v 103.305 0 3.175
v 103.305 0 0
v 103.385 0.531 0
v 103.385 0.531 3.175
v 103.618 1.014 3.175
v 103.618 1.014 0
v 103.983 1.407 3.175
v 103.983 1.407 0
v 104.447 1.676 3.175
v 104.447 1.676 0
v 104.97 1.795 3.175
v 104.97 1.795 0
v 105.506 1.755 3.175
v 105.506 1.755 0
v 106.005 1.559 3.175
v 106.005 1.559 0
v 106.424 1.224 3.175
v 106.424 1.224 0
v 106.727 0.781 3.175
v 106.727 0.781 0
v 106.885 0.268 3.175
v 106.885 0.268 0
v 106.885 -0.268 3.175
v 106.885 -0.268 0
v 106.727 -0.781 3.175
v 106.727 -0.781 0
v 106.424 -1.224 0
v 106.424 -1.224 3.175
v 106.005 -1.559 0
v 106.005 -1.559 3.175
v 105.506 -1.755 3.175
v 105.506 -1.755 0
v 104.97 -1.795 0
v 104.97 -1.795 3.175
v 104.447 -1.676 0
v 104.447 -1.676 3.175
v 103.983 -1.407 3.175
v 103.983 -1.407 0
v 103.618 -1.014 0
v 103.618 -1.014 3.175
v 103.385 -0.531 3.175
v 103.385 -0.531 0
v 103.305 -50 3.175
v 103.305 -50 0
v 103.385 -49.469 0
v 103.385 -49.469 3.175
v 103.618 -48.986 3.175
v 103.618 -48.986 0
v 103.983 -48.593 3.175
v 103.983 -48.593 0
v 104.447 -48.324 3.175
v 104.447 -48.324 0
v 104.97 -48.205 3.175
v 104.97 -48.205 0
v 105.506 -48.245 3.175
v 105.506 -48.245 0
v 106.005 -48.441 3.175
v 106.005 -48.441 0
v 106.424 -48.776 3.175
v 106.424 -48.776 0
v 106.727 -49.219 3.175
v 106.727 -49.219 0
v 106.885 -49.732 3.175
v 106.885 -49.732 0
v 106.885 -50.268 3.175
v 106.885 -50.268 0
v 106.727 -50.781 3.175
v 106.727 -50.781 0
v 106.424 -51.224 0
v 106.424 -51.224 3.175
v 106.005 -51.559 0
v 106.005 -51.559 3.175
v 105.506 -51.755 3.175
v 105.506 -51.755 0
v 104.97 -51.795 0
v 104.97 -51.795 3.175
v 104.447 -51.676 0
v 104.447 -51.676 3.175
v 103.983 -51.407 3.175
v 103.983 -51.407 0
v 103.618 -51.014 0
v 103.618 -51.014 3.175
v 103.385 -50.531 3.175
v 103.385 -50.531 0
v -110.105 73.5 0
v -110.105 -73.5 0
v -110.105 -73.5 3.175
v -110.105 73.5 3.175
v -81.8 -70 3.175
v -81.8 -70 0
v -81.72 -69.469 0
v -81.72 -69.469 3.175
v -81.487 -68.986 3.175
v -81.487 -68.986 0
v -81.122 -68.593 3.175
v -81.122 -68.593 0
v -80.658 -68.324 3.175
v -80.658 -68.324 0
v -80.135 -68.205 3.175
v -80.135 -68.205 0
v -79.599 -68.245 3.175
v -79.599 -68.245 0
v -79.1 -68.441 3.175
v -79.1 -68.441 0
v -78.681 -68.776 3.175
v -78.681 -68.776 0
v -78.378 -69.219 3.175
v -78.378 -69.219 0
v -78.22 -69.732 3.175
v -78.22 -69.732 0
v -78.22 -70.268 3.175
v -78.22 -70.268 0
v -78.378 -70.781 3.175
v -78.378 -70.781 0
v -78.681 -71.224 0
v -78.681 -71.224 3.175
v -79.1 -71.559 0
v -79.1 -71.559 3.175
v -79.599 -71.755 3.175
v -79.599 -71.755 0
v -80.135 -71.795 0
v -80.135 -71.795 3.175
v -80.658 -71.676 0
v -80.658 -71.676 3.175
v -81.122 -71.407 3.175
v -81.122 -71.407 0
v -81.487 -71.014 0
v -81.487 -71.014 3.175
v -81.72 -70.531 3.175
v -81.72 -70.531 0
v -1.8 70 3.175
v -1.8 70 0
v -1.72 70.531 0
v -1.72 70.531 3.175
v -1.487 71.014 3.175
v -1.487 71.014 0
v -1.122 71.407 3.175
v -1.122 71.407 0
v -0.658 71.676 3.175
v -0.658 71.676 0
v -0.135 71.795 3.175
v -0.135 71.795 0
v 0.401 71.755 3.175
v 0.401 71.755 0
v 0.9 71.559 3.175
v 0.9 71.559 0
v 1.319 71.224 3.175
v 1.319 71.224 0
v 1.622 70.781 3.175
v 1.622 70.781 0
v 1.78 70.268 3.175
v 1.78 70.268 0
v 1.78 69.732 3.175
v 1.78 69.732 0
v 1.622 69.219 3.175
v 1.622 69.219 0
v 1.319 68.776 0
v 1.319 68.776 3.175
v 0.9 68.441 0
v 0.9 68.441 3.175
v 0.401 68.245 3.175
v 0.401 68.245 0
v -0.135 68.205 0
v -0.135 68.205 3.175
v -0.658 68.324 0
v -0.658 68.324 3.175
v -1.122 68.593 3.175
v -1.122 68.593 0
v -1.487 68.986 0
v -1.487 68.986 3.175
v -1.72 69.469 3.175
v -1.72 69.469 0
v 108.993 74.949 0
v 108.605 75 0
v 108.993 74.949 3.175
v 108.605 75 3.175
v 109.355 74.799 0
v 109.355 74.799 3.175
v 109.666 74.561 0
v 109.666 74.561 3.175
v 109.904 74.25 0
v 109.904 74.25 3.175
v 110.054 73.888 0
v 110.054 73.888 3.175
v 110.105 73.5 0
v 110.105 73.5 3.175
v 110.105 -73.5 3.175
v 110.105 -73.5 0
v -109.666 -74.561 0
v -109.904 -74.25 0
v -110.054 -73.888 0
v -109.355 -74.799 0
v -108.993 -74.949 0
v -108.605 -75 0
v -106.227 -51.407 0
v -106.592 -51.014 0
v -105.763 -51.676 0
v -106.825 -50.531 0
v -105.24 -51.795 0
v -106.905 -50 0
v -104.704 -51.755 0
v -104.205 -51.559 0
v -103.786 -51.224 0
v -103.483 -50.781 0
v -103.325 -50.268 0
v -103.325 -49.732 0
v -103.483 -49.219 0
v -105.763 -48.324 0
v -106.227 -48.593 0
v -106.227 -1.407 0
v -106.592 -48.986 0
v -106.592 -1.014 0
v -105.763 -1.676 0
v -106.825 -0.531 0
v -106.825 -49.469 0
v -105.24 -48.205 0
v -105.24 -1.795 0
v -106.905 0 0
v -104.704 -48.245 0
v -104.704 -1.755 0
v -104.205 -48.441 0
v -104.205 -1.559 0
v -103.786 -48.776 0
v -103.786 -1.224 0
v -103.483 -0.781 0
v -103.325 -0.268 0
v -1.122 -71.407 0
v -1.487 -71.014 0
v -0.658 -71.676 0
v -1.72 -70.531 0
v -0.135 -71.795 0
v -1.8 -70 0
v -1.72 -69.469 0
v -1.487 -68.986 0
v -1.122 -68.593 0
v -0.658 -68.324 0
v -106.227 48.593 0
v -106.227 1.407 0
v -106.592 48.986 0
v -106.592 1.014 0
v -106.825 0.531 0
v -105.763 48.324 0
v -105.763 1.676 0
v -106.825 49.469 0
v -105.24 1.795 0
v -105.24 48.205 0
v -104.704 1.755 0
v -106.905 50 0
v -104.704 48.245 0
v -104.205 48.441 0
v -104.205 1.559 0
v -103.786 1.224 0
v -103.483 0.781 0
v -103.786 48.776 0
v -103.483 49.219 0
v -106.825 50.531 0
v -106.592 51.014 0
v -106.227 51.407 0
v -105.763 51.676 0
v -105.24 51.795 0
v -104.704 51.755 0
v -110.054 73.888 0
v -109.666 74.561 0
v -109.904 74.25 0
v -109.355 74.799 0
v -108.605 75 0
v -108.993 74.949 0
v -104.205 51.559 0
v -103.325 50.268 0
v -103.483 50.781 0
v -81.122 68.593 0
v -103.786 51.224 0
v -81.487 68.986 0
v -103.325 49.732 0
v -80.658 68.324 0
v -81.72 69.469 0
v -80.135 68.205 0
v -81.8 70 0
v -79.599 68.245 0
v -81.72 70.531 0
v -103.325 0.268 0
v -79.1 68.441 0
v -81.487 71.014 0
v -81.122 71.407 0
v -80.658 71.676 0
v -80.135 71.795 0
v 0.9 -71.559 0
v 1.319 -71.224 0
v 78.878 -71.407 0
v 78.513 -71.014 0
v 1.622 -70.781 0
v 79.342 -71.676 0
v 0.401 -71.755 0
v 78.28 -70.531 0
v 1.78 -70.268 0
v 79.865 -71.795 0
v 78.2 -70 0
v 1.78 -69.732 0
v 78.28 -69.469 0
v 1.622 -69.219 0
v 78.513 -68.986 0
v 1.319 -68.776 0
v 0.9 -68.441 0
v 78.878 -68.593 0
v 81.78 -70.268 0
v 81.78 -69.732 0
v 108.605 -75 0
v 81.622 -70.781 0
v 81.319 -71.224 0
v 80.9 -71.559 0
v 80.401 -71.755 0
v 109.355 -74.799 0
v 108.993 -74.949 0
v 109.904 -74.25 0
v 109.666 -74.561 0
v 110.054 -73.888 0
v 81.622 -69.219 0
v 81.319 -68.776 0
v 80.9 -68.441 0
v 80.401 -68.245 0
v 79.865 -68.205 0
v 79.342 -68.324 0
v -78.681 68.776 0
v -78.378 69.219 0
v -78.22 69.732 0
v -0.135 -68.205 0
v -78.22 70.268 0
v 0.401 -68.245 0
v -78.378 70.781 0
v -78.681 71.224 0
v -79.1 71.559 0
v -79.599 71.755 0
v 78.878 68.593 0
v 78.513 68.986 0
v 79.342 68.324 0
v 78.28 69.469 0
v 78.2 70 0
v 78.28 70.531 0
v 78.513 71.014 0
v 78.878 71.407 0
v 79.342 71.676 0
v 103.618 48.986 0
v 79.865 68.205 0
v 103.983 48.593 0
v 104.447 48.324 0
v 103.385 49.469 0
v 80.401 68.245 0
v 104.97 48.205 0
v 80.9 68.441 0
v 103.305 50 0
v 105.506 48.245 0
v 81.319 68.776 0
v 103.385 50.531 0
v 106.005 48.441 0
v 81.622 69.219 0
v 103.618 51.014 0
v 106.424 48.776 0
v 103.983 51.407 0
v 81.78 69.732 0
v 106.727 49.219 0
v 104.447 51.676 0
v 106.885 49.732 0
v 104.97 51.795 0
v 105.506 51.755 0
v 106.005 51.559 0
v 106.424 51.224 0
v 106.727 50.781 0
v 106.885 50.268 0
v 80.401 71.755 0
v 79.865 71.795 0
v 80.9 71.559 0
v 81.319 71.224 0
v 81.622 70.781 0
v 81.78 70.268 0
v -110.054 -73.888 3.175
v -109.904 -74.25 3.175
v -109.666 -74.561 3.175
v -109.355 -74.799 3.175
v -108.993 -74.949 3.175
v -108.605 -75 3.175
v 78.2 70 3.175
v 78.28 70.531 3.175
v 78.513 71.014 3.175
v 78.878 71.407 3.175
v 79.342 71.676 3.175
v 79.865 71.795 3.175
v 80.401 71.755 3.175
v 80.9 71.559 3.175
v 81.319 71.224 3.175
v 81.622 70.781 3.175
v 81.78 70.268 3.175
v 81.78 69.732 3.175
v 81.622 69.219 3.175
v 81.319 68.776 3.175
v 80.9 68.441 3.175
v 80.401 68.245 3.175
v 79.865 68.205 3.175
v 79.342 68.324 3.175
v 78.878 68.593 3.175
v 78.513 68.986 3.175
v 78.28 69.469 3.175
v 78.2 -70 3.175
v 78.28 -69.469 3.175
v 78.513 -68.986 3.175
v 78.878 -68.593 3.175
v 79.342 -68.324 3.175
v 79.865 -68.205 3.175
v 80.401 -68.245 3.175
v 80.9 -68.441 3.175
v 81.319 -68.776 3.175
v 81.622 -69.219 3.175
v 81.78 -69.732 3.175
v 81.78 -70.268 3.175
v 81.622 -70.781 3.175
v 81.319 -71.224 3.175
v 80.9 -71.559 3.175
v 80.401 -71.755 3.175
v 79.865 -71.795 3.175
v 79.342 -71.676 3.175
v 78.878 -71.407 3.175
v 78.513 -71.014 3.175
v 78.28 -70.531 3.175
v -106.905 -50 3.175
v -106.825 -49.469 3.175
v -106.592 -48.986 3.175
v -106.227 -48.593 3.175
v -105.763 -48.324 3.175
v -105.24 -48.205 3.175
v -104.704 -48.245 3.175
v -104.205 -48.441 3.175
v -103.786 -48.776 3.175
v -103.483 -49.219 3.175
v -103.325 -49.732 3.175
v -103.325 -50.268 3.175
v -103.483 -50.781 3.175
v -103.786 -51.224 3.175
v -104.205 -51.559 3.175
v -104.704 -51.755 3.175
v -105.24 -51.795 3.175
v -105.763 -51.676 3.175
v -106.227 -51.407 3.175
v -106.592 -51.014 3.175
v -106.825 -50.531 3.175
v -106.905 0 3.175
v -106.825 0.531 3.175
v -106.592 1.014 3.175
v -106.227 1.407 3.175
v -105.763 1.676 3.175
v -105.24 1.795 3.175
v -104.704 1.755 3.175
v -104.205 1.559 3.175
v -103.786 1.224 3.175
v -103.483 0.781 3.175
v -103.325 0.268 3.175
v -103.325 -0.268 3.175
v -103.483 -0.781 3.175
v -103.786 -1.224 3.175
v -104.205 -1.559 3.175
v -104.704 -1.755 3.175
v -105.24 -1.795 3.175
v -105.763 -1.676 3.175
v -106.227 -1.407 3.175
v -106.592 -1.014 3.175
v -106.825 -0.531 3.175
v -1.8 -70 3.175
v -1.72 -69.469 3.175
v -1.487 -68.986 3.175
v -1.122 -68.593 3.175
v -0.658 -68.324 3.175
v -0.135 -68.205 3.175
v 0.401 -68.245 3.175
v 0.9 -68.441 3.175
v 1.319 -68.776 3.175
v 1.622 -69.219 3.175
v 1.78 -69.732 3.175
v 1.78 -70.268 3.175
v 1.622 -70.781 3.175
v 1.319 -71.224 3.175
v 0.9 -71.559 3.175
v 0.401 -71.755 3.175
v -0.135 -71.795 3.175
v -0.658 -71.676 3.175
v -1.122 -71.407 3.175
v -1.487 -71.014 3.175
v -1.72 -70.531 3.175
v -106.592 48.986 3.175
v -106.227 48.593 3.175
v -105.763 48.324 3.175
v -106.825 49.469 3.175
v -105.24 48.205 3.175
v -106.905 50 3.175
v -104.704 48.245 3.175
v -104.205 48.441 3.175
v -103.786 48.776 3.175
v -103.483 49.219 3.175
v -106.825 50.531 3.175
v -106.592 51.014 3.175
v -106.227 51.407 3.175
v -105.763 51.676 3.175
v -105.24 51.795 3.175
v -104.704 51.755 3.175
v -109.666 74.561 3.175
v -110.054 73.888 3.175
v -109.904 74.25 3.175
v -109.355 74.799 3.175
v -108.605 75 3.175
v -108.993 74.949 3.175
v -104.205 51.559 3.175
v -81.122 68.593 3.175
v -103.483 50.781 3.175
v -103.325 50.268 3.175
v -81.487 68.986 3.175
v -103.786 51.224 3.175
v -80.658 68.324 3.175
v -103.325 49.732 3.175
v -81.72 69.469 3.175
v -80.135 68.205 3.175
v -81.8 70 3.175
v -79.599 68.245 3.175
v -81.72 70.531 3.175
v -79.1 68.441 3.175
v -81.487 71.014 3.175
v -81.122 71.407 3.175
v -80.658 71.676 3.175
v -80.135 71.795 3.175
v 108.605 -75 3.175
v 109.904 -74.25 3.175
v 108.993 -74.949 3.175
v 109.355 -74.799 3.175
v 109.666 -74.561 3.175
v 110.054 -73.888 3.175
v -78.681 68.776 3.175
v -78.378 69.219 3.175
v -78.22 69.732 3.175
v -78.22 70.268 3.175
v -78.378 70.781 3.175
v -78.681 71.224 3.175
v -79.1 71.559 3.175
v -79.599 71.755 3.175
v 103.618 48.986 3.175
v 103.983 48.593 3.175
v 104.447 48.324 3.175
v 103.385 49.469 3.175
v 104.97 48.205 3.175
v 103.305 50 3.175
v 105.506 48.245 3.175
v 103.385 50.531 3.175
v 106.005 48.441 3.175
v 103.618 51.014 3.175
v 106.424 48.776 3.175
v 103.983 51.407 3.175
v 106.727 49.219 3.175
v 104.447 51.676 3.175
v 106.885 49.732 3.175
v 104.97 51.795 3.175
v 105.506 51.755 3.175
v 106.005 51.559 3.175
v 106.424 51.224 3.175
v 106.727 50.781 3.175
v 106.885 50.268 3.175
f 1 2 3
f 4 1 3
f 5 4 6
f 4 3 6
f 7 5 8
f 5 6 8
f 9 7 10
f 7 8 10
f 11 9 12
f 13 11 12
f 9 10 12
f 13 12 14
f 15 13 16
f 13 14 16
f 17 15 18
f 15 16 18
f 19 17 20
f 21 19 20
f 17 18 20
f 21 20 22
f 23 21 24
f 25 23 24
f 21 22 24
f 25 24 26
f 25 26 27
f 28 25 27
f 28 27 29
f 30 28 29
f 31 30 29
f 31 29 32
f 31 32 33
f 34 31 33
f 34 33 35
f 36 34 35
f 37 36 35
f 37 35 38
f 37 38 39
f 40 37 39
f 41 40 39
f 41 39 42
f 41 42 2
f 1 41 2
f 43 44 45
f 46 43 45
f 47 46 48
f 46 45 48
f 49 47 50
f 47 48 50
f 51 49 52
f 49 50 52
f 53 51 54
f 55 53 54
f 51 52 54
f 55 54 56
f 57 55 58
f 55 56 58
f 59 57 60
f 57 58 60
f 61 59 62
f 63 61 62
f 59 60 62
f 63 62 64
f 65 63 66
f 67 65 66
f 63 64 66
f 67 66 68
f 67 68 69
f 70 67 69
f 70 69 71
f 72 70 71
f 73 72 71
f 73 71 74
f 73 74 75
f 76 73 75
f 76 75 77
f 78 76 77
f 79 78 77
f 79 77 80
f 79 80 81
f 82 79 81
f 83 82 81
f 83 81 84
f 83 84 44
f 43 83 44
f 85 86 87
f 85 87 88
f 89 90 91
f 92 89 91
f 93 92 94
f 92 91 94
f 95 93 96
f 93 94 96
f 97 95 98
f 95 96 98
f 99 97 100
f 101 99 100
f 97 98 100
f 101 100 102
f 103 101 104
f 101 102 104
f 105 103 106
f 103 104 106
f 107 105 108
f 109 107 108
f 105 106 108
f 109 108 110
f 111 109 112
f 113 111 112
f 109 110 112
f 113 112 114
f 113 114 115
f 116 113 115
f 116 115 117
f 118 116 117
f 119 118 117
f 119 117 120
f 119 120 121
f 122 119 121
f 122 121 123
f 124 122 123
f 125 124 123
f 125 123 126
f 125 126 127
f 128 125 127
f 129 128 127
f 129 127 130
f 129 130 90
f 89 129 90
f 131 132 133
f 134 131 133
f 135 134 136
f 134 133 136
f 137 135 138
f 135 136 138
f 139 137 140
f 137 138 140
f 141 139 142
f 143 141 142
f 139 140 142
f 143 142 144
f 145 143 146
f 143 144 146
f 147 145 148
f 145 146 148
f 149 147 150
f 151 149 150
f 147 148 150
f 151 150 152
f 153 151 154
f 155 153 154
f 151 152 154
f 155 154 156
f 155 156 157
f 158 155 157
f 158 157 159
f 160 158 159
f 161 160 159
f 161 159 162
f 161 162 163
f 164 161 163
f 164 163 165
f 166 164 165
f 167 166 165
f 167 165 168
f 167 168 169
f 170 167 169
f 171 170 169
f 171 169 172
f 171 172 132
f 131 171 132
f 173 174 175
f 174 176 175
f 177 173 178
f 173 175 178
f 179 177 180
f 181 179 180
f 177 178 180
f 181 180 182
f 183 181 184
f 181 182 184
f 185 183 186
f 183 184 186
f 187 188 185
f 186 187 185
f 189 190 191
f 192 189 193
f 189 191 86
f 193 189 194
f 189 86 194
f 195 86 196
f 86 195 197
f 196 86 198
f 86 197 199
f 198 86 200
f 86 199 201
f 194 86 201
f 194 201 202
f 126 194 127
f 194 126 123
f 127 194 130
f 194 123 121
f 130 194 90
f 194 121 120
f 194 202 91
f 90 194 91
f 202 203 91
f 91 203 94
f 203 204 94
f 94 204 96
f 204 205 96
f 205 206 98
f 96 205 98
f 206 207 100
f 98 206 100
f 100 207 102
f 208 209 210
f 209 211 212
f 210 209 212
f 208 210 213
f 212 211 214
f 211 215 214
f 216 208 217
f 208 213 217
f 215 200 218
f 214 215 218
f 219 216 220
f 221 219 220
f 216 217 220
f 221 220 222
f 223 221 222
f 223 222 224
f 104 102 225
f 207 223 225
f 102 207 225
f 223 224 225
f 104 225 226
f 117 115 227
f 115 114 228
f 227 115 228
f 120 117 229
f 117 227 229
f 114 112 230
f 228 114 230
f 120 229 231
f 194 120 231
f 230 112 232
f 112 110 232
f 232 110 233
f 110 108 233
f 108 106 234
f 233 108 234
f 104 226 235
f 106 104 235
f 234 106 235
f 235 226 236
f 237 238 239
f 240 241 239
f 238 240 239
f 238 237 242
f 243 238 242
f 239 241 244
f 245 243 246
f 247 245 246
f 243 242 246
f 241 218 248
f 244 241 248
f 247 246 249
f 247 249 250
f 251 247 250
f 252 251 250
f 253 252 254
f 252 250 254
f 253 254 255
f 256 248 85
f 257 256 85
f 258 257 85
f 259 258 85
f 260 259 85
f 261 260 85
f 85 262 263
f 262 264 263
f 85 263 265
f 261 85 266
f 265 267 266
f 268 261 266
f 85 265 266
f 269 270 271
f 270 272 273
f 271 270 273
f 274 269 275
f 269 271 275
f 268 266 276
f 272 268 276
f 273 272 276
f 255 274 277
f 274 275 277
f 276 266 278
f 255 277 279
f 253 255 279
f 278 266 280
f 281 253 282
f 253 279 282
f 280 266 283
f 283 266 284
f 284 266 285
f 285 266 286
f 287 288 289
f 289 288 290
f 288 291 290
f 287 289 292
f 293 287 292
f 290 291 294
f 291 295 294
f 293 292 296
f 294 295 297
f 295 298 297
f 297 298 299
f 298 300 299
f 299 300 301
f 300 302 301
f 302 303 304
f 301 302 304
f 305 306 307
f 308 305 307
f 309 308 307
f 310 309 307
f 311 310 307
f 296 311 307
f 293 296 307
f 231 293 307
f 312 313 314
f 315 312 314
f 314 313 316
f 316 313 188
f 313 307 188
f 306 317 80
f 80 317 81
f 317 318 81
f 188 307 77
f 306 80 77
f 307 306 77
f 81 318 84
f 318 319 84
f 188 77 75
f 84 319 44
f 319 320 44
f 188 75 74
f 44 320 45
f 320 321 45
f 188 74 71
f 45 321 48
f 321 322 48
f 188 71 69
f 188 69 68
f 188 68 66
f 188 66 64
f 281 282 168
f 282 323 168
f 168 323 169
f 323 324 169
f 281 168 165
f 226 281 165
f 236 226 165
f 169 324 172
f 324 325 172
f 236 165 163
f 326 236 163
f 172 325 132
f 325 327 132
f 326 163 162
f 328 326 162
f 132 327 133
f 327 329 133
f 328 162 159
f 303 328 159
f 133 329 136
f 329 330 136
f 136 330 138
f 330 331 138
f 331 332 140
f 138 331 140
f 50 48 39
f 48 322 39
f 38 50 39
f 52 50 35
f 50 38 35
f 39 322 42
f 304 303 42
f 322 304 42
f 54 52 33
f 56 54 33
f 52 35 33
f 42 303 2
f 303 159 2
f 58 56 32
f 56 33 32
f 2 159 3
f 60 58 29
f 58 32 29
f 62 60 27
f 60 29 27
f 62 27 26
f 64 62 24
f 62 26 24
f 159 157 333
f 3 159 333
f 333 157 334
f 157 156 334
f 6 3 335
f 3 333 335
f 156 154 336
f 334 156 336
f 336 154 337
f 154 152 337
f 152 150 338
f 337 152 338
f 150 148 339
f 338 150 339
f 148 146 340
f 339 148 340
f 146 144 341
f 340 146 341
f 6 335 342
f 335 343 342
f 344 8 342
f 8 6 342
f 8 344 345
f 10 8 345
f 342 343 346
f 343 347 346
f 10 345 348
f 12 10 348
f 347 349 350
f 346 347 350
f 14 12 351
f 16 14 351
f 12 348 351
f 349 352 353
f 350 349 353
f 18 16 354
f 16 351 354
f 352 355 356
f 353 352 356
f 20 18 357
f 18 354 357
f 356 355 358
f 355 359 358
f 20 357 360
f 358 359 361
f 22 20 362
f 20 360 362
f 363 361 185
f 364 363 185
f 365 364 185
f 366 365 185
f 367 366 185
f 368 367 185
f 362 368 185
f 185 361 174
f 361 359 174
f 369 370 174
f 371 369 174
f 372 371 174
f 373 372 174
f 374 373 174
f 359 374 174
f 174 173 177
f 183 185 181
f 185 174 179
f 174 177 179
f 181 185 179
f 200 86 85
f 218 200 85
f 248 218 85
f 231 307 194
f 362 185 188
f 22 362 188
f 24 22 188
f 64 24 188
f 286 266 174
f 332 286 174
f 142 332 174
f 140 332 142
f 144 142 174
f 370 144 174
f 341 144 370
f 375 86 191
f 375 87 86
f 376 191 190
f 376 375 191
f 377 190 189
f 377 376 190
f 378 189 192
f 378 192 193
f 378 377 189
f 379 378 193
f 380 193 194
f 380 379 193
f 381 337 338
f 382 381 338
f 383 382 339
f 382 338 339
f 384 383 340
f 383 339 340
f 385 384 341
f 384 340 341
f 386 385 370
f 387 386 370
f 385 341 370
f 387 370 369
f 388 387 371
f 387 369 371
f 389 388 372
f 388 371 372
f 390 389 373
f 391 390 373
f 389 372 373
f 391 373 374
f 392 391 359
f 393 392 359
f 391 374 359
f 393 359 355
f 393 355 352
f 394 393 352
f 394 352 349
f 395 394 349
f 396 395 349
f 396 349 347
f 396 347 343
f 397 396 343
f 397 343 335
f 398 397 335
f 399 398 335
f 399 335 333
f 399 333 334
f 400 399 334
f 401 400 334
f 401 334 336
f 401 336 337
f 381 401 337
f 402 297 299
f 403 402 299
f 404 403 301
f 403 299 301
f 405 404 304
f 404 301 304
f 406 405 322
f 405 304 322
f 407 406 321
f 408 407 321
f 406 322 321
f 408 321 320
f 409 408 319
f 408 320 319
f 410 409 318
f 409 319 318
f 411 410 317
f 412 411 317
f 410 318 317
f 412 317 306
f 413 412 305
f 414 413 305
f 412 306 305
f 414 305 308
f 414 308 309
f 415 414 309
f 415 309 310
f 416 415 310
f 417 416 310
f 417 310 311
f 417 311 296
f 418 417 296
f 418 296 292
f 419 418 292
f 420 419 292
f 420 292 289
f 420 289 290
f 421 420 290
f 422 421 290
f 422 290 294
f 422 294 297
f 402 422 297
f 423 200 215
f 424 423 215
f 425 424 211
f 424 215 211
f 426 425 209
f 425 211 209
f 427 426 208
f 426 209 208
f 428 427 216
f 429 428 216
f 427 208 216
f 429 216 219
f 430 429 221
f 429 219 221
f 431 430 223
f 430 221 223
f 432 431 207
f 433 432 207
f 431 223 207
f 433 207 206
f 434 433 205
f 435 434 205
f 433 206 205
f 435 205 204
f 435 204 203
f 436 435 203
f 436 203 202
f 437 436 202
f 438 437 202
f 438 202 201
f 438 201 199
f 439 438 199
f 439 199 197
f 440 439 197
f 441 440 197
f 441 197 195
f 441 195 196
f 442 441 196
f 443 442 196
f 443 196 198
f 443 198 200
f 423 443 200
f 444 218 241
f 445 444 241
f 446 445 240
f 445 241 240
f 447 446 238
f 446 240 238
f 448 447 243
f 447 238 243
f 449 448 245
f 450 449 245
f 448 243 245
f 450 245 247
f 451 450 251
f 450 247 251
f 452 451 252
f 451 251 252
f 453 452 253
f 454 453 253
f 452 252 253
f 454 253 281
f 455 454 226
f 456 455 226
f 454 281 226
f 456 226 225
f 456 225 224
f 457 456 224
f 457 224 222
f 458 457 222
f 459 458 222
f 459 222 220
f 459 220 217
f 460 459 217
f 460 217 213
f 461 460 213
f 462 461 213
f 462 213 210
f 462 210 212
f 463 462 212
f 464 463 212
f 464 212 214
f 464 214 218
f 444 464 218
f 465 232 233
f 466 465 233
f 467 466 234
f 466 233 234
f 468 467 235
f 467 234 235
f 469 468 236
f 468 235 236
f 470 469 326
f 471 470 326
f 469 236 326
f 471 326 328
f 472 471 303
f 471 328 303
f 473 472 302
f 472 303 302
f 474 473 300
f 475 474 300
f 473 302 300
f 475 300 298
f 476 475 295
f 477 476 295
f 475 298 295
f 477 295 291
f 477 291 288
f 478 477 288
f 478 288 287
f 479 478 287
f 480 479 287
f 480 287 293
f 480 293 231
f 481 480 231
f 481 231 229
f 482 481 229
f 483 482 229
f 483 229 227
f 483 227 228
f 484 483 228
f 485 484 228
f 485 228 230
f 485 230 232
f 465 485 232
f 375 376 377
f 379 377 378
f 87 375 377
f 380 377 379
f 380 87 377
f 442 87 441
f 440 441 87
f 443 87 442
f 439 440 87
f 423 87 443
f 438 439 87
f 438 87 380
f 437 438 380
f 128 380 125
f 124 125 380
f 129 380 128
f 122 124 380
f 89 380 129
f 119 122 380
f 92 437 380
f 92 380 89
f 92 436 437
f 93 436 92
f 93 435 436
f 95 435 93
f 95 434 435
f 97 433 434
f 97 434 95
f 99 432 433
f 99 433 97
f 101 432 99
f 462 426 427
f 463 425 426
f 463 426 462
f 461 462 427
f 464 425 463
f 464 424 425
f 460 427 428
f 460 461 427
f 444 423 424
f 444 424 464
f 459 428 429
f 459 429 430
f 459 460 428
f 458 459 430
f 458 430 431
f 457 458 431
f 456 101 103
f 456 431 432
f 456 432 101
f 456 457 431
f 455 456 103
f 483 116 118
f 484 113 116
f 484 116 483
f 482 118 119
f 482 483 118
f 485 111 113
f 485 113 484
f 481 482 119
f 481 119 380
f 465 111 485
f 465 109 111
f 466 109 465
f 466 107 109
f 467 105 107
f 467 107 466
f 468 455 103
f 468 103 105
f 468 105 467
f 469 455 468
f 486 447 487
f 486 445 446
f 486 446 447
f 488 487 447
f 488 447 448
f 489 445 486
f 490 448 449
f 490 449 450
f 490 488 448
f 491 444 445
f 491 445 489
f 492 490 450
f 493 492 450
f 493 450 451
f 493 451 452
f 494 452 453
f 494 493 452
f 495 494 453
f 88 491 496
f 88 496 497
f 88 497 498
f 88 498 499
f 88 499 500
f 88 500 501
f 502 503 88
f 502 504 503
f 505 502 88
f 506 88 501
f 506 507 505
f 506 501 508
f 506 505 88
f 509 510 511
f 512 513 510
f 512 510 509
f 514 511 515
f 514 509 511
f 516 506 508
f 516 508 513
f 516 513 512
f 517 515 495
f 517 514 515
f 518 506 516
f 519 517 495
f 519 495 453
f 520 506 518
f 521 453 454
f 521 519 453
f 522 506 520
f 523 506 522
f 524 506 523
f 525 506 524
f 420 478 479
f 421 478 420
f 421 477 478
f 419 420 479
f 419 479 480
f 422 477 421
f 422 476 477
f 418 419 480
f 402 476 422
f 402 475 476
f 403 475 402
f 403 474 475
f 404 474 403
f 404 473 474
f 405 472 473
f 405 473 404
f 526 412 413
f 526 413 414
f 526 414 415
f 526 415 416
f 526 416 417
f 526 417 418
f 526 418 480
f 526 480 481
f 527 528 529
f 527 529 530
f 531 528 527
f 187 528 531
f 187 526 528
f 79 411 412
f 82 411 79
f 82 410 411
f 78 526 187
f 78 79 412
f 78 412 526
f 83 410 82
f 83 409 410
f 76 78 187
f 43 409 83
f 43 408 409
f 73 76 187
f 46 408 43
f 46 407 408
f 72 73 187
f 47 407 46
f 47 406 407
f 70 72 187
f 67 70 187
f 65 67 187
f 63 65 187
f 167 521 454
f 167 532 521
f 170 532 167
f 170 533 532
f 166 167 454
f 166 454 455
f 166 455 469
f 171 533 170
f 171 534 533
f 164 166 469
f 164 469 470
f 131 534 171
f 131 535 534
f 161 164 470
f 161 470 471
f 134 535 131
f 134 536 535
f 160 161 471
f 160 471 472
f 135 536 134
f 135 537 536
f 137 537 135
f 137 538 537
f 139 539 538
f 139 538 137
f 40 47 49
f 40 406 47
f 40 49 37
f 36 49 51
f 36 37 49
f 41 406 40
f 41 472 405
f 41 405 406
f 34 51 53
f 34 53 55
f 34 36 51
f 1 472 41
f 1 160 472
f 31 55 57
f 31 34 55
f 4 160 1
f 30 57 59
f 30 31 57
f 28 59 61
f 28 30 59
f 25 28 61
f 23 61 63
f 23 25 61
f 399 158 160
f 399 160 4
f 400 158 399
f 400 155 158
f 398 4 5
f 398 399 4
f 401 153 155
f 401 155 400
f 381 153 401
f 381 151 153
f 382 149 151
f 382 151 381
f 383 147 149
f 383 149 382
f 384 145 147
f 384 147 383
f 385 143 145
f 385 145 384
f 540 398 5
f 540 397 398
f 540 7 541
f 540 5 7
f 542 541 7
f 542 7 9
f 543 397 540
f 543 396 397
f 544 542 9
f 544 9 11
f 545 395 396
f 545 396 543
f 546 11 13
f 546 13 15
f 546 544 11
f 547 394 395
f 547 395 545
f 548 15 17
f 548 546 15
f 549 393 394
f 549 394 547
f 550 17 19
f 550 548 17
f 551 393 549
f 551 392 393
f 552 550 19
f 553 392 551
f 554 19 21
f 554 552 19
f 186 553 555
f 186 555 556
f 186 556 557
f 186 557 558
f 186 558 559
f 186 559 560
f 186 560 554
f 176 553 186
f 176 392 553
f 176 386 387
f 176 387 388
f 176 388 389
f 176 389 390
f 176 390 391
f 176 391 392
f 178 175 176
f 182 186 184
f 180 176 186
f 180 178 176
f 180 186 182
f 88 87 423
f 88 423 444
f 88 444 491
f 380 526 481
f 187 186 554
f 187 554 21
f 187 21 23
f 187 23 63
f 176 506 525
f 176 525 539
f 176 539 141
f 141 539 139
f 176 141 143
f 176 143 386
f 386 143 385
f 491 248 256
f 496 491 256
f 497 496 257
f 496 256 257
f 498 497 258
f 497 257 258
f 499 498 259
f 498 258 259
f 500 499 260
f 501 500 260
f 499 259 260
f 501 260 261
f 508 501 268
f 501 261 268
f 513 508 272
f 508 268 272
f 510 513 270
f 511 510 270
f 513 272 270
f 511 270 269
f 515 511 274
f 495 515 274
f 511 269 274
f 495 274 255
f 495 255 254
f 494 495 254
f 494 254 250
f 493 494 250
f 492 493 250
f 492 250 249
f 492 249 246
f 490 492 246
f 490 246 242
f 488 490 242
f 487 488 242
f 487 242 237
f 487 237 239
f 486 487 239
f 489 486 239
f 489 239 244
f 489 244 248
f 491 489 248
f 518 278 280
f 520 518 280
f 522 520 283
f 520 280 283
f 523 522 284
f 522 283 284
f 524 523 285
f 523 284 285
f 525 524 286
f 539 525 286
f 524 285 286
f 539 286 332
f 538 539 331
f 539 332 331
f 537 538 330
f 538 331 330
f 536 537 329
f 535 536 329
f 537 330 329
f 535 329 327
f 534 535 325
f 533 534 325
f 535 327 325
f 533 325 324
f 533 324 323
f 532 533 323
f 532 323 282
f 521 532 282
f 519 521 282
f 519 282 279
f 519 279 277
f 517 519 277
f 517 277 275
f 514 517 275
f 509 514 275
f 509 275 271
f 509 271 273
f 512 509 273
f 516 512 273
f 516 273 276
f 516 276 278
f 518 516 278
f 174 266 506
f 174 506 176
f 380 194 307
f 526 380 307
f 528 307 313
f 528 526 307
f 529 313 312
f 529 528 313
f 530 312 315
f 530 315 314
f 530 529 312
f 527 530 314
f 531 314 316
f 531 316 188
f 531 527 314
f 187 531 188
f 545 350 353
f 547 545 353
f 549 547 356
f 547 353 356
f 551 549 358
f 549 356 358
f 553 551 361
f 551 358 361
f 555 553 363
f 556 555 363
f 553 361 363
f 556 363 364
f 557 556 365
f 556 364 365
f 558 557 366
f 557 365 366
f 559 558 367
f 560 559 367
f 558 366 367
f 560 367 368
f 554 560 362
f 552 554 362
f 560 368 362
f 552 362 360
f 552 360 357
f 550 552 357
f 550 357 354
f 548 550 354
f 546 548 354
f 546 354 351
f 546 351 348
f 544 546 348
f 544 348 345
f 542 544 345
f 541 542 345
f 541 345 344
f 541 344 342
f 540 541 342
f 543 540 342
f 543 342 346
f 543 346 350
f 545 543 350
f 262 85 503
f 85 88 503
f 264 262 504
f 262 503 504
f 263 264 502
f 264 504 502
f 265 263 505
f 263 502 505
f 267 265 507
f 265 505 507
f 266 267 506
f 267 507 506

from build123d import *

# Parameters (mm, degrees)
SKETCH1_W            = 220.21
SKETCH1_H            = 150
BOSS_EXTRUDE1_DEPTH  = 3.175
M3_CLEARANCE_HOLE1_D = 3.6
SKETCH4_W            = 10
SKETCH4_H            = 10
BOSS_EXTRUDE2_DEPTH  = 3.175
FILLET2_R            = 1.5


with BuildPart() as part:
    # Sketch1 → Boss-Extrude1 (new body)
    with BuildSketch(Plane.XY):
        Rectangle(SKETCH1_W, SKETCH1_H)
    extrude(amount=BOSS_EXTRUDE1_DEPTH)

    # M3 Clearance Hole1 (through all)
    with Locations(Plane.XY.offset(3.175)):
        with Locations((0, 0), (-80, 70), (80, 70), (0, 70), (-105.105, 50), (-105.105, 0), (-105.105, -50), (-80, -70), (0, -70), (80, -70), (105.105, -50), (105.105, 0), (105.105, 50)):
            Hole(M3_CLEARANCE_HOLE1_D / 2)

    # Sketch4 → Boss-Extrude2 (add, through all)
    with BuildSketch(Plane.XY.offset(3.175)):
        Rectangle(SKETCH4_W, SKETCH4_H)
    extrude(amount=-BOSS_EXTRUDE2_DEPTH)

    # Fillet2
    fillet2_edges = [part.edges().sort_by_distance(p)[0] for p in [
        (-110.105, -75, 1.5875),
        (-110.105, 75, 1.5875),
        (110.105, 75, 1.5875),
        (110.105, -75, 1.5875),
    ]]
    fillet(fillet2_edges, radius=FILLET2_R)


solid = part.part
